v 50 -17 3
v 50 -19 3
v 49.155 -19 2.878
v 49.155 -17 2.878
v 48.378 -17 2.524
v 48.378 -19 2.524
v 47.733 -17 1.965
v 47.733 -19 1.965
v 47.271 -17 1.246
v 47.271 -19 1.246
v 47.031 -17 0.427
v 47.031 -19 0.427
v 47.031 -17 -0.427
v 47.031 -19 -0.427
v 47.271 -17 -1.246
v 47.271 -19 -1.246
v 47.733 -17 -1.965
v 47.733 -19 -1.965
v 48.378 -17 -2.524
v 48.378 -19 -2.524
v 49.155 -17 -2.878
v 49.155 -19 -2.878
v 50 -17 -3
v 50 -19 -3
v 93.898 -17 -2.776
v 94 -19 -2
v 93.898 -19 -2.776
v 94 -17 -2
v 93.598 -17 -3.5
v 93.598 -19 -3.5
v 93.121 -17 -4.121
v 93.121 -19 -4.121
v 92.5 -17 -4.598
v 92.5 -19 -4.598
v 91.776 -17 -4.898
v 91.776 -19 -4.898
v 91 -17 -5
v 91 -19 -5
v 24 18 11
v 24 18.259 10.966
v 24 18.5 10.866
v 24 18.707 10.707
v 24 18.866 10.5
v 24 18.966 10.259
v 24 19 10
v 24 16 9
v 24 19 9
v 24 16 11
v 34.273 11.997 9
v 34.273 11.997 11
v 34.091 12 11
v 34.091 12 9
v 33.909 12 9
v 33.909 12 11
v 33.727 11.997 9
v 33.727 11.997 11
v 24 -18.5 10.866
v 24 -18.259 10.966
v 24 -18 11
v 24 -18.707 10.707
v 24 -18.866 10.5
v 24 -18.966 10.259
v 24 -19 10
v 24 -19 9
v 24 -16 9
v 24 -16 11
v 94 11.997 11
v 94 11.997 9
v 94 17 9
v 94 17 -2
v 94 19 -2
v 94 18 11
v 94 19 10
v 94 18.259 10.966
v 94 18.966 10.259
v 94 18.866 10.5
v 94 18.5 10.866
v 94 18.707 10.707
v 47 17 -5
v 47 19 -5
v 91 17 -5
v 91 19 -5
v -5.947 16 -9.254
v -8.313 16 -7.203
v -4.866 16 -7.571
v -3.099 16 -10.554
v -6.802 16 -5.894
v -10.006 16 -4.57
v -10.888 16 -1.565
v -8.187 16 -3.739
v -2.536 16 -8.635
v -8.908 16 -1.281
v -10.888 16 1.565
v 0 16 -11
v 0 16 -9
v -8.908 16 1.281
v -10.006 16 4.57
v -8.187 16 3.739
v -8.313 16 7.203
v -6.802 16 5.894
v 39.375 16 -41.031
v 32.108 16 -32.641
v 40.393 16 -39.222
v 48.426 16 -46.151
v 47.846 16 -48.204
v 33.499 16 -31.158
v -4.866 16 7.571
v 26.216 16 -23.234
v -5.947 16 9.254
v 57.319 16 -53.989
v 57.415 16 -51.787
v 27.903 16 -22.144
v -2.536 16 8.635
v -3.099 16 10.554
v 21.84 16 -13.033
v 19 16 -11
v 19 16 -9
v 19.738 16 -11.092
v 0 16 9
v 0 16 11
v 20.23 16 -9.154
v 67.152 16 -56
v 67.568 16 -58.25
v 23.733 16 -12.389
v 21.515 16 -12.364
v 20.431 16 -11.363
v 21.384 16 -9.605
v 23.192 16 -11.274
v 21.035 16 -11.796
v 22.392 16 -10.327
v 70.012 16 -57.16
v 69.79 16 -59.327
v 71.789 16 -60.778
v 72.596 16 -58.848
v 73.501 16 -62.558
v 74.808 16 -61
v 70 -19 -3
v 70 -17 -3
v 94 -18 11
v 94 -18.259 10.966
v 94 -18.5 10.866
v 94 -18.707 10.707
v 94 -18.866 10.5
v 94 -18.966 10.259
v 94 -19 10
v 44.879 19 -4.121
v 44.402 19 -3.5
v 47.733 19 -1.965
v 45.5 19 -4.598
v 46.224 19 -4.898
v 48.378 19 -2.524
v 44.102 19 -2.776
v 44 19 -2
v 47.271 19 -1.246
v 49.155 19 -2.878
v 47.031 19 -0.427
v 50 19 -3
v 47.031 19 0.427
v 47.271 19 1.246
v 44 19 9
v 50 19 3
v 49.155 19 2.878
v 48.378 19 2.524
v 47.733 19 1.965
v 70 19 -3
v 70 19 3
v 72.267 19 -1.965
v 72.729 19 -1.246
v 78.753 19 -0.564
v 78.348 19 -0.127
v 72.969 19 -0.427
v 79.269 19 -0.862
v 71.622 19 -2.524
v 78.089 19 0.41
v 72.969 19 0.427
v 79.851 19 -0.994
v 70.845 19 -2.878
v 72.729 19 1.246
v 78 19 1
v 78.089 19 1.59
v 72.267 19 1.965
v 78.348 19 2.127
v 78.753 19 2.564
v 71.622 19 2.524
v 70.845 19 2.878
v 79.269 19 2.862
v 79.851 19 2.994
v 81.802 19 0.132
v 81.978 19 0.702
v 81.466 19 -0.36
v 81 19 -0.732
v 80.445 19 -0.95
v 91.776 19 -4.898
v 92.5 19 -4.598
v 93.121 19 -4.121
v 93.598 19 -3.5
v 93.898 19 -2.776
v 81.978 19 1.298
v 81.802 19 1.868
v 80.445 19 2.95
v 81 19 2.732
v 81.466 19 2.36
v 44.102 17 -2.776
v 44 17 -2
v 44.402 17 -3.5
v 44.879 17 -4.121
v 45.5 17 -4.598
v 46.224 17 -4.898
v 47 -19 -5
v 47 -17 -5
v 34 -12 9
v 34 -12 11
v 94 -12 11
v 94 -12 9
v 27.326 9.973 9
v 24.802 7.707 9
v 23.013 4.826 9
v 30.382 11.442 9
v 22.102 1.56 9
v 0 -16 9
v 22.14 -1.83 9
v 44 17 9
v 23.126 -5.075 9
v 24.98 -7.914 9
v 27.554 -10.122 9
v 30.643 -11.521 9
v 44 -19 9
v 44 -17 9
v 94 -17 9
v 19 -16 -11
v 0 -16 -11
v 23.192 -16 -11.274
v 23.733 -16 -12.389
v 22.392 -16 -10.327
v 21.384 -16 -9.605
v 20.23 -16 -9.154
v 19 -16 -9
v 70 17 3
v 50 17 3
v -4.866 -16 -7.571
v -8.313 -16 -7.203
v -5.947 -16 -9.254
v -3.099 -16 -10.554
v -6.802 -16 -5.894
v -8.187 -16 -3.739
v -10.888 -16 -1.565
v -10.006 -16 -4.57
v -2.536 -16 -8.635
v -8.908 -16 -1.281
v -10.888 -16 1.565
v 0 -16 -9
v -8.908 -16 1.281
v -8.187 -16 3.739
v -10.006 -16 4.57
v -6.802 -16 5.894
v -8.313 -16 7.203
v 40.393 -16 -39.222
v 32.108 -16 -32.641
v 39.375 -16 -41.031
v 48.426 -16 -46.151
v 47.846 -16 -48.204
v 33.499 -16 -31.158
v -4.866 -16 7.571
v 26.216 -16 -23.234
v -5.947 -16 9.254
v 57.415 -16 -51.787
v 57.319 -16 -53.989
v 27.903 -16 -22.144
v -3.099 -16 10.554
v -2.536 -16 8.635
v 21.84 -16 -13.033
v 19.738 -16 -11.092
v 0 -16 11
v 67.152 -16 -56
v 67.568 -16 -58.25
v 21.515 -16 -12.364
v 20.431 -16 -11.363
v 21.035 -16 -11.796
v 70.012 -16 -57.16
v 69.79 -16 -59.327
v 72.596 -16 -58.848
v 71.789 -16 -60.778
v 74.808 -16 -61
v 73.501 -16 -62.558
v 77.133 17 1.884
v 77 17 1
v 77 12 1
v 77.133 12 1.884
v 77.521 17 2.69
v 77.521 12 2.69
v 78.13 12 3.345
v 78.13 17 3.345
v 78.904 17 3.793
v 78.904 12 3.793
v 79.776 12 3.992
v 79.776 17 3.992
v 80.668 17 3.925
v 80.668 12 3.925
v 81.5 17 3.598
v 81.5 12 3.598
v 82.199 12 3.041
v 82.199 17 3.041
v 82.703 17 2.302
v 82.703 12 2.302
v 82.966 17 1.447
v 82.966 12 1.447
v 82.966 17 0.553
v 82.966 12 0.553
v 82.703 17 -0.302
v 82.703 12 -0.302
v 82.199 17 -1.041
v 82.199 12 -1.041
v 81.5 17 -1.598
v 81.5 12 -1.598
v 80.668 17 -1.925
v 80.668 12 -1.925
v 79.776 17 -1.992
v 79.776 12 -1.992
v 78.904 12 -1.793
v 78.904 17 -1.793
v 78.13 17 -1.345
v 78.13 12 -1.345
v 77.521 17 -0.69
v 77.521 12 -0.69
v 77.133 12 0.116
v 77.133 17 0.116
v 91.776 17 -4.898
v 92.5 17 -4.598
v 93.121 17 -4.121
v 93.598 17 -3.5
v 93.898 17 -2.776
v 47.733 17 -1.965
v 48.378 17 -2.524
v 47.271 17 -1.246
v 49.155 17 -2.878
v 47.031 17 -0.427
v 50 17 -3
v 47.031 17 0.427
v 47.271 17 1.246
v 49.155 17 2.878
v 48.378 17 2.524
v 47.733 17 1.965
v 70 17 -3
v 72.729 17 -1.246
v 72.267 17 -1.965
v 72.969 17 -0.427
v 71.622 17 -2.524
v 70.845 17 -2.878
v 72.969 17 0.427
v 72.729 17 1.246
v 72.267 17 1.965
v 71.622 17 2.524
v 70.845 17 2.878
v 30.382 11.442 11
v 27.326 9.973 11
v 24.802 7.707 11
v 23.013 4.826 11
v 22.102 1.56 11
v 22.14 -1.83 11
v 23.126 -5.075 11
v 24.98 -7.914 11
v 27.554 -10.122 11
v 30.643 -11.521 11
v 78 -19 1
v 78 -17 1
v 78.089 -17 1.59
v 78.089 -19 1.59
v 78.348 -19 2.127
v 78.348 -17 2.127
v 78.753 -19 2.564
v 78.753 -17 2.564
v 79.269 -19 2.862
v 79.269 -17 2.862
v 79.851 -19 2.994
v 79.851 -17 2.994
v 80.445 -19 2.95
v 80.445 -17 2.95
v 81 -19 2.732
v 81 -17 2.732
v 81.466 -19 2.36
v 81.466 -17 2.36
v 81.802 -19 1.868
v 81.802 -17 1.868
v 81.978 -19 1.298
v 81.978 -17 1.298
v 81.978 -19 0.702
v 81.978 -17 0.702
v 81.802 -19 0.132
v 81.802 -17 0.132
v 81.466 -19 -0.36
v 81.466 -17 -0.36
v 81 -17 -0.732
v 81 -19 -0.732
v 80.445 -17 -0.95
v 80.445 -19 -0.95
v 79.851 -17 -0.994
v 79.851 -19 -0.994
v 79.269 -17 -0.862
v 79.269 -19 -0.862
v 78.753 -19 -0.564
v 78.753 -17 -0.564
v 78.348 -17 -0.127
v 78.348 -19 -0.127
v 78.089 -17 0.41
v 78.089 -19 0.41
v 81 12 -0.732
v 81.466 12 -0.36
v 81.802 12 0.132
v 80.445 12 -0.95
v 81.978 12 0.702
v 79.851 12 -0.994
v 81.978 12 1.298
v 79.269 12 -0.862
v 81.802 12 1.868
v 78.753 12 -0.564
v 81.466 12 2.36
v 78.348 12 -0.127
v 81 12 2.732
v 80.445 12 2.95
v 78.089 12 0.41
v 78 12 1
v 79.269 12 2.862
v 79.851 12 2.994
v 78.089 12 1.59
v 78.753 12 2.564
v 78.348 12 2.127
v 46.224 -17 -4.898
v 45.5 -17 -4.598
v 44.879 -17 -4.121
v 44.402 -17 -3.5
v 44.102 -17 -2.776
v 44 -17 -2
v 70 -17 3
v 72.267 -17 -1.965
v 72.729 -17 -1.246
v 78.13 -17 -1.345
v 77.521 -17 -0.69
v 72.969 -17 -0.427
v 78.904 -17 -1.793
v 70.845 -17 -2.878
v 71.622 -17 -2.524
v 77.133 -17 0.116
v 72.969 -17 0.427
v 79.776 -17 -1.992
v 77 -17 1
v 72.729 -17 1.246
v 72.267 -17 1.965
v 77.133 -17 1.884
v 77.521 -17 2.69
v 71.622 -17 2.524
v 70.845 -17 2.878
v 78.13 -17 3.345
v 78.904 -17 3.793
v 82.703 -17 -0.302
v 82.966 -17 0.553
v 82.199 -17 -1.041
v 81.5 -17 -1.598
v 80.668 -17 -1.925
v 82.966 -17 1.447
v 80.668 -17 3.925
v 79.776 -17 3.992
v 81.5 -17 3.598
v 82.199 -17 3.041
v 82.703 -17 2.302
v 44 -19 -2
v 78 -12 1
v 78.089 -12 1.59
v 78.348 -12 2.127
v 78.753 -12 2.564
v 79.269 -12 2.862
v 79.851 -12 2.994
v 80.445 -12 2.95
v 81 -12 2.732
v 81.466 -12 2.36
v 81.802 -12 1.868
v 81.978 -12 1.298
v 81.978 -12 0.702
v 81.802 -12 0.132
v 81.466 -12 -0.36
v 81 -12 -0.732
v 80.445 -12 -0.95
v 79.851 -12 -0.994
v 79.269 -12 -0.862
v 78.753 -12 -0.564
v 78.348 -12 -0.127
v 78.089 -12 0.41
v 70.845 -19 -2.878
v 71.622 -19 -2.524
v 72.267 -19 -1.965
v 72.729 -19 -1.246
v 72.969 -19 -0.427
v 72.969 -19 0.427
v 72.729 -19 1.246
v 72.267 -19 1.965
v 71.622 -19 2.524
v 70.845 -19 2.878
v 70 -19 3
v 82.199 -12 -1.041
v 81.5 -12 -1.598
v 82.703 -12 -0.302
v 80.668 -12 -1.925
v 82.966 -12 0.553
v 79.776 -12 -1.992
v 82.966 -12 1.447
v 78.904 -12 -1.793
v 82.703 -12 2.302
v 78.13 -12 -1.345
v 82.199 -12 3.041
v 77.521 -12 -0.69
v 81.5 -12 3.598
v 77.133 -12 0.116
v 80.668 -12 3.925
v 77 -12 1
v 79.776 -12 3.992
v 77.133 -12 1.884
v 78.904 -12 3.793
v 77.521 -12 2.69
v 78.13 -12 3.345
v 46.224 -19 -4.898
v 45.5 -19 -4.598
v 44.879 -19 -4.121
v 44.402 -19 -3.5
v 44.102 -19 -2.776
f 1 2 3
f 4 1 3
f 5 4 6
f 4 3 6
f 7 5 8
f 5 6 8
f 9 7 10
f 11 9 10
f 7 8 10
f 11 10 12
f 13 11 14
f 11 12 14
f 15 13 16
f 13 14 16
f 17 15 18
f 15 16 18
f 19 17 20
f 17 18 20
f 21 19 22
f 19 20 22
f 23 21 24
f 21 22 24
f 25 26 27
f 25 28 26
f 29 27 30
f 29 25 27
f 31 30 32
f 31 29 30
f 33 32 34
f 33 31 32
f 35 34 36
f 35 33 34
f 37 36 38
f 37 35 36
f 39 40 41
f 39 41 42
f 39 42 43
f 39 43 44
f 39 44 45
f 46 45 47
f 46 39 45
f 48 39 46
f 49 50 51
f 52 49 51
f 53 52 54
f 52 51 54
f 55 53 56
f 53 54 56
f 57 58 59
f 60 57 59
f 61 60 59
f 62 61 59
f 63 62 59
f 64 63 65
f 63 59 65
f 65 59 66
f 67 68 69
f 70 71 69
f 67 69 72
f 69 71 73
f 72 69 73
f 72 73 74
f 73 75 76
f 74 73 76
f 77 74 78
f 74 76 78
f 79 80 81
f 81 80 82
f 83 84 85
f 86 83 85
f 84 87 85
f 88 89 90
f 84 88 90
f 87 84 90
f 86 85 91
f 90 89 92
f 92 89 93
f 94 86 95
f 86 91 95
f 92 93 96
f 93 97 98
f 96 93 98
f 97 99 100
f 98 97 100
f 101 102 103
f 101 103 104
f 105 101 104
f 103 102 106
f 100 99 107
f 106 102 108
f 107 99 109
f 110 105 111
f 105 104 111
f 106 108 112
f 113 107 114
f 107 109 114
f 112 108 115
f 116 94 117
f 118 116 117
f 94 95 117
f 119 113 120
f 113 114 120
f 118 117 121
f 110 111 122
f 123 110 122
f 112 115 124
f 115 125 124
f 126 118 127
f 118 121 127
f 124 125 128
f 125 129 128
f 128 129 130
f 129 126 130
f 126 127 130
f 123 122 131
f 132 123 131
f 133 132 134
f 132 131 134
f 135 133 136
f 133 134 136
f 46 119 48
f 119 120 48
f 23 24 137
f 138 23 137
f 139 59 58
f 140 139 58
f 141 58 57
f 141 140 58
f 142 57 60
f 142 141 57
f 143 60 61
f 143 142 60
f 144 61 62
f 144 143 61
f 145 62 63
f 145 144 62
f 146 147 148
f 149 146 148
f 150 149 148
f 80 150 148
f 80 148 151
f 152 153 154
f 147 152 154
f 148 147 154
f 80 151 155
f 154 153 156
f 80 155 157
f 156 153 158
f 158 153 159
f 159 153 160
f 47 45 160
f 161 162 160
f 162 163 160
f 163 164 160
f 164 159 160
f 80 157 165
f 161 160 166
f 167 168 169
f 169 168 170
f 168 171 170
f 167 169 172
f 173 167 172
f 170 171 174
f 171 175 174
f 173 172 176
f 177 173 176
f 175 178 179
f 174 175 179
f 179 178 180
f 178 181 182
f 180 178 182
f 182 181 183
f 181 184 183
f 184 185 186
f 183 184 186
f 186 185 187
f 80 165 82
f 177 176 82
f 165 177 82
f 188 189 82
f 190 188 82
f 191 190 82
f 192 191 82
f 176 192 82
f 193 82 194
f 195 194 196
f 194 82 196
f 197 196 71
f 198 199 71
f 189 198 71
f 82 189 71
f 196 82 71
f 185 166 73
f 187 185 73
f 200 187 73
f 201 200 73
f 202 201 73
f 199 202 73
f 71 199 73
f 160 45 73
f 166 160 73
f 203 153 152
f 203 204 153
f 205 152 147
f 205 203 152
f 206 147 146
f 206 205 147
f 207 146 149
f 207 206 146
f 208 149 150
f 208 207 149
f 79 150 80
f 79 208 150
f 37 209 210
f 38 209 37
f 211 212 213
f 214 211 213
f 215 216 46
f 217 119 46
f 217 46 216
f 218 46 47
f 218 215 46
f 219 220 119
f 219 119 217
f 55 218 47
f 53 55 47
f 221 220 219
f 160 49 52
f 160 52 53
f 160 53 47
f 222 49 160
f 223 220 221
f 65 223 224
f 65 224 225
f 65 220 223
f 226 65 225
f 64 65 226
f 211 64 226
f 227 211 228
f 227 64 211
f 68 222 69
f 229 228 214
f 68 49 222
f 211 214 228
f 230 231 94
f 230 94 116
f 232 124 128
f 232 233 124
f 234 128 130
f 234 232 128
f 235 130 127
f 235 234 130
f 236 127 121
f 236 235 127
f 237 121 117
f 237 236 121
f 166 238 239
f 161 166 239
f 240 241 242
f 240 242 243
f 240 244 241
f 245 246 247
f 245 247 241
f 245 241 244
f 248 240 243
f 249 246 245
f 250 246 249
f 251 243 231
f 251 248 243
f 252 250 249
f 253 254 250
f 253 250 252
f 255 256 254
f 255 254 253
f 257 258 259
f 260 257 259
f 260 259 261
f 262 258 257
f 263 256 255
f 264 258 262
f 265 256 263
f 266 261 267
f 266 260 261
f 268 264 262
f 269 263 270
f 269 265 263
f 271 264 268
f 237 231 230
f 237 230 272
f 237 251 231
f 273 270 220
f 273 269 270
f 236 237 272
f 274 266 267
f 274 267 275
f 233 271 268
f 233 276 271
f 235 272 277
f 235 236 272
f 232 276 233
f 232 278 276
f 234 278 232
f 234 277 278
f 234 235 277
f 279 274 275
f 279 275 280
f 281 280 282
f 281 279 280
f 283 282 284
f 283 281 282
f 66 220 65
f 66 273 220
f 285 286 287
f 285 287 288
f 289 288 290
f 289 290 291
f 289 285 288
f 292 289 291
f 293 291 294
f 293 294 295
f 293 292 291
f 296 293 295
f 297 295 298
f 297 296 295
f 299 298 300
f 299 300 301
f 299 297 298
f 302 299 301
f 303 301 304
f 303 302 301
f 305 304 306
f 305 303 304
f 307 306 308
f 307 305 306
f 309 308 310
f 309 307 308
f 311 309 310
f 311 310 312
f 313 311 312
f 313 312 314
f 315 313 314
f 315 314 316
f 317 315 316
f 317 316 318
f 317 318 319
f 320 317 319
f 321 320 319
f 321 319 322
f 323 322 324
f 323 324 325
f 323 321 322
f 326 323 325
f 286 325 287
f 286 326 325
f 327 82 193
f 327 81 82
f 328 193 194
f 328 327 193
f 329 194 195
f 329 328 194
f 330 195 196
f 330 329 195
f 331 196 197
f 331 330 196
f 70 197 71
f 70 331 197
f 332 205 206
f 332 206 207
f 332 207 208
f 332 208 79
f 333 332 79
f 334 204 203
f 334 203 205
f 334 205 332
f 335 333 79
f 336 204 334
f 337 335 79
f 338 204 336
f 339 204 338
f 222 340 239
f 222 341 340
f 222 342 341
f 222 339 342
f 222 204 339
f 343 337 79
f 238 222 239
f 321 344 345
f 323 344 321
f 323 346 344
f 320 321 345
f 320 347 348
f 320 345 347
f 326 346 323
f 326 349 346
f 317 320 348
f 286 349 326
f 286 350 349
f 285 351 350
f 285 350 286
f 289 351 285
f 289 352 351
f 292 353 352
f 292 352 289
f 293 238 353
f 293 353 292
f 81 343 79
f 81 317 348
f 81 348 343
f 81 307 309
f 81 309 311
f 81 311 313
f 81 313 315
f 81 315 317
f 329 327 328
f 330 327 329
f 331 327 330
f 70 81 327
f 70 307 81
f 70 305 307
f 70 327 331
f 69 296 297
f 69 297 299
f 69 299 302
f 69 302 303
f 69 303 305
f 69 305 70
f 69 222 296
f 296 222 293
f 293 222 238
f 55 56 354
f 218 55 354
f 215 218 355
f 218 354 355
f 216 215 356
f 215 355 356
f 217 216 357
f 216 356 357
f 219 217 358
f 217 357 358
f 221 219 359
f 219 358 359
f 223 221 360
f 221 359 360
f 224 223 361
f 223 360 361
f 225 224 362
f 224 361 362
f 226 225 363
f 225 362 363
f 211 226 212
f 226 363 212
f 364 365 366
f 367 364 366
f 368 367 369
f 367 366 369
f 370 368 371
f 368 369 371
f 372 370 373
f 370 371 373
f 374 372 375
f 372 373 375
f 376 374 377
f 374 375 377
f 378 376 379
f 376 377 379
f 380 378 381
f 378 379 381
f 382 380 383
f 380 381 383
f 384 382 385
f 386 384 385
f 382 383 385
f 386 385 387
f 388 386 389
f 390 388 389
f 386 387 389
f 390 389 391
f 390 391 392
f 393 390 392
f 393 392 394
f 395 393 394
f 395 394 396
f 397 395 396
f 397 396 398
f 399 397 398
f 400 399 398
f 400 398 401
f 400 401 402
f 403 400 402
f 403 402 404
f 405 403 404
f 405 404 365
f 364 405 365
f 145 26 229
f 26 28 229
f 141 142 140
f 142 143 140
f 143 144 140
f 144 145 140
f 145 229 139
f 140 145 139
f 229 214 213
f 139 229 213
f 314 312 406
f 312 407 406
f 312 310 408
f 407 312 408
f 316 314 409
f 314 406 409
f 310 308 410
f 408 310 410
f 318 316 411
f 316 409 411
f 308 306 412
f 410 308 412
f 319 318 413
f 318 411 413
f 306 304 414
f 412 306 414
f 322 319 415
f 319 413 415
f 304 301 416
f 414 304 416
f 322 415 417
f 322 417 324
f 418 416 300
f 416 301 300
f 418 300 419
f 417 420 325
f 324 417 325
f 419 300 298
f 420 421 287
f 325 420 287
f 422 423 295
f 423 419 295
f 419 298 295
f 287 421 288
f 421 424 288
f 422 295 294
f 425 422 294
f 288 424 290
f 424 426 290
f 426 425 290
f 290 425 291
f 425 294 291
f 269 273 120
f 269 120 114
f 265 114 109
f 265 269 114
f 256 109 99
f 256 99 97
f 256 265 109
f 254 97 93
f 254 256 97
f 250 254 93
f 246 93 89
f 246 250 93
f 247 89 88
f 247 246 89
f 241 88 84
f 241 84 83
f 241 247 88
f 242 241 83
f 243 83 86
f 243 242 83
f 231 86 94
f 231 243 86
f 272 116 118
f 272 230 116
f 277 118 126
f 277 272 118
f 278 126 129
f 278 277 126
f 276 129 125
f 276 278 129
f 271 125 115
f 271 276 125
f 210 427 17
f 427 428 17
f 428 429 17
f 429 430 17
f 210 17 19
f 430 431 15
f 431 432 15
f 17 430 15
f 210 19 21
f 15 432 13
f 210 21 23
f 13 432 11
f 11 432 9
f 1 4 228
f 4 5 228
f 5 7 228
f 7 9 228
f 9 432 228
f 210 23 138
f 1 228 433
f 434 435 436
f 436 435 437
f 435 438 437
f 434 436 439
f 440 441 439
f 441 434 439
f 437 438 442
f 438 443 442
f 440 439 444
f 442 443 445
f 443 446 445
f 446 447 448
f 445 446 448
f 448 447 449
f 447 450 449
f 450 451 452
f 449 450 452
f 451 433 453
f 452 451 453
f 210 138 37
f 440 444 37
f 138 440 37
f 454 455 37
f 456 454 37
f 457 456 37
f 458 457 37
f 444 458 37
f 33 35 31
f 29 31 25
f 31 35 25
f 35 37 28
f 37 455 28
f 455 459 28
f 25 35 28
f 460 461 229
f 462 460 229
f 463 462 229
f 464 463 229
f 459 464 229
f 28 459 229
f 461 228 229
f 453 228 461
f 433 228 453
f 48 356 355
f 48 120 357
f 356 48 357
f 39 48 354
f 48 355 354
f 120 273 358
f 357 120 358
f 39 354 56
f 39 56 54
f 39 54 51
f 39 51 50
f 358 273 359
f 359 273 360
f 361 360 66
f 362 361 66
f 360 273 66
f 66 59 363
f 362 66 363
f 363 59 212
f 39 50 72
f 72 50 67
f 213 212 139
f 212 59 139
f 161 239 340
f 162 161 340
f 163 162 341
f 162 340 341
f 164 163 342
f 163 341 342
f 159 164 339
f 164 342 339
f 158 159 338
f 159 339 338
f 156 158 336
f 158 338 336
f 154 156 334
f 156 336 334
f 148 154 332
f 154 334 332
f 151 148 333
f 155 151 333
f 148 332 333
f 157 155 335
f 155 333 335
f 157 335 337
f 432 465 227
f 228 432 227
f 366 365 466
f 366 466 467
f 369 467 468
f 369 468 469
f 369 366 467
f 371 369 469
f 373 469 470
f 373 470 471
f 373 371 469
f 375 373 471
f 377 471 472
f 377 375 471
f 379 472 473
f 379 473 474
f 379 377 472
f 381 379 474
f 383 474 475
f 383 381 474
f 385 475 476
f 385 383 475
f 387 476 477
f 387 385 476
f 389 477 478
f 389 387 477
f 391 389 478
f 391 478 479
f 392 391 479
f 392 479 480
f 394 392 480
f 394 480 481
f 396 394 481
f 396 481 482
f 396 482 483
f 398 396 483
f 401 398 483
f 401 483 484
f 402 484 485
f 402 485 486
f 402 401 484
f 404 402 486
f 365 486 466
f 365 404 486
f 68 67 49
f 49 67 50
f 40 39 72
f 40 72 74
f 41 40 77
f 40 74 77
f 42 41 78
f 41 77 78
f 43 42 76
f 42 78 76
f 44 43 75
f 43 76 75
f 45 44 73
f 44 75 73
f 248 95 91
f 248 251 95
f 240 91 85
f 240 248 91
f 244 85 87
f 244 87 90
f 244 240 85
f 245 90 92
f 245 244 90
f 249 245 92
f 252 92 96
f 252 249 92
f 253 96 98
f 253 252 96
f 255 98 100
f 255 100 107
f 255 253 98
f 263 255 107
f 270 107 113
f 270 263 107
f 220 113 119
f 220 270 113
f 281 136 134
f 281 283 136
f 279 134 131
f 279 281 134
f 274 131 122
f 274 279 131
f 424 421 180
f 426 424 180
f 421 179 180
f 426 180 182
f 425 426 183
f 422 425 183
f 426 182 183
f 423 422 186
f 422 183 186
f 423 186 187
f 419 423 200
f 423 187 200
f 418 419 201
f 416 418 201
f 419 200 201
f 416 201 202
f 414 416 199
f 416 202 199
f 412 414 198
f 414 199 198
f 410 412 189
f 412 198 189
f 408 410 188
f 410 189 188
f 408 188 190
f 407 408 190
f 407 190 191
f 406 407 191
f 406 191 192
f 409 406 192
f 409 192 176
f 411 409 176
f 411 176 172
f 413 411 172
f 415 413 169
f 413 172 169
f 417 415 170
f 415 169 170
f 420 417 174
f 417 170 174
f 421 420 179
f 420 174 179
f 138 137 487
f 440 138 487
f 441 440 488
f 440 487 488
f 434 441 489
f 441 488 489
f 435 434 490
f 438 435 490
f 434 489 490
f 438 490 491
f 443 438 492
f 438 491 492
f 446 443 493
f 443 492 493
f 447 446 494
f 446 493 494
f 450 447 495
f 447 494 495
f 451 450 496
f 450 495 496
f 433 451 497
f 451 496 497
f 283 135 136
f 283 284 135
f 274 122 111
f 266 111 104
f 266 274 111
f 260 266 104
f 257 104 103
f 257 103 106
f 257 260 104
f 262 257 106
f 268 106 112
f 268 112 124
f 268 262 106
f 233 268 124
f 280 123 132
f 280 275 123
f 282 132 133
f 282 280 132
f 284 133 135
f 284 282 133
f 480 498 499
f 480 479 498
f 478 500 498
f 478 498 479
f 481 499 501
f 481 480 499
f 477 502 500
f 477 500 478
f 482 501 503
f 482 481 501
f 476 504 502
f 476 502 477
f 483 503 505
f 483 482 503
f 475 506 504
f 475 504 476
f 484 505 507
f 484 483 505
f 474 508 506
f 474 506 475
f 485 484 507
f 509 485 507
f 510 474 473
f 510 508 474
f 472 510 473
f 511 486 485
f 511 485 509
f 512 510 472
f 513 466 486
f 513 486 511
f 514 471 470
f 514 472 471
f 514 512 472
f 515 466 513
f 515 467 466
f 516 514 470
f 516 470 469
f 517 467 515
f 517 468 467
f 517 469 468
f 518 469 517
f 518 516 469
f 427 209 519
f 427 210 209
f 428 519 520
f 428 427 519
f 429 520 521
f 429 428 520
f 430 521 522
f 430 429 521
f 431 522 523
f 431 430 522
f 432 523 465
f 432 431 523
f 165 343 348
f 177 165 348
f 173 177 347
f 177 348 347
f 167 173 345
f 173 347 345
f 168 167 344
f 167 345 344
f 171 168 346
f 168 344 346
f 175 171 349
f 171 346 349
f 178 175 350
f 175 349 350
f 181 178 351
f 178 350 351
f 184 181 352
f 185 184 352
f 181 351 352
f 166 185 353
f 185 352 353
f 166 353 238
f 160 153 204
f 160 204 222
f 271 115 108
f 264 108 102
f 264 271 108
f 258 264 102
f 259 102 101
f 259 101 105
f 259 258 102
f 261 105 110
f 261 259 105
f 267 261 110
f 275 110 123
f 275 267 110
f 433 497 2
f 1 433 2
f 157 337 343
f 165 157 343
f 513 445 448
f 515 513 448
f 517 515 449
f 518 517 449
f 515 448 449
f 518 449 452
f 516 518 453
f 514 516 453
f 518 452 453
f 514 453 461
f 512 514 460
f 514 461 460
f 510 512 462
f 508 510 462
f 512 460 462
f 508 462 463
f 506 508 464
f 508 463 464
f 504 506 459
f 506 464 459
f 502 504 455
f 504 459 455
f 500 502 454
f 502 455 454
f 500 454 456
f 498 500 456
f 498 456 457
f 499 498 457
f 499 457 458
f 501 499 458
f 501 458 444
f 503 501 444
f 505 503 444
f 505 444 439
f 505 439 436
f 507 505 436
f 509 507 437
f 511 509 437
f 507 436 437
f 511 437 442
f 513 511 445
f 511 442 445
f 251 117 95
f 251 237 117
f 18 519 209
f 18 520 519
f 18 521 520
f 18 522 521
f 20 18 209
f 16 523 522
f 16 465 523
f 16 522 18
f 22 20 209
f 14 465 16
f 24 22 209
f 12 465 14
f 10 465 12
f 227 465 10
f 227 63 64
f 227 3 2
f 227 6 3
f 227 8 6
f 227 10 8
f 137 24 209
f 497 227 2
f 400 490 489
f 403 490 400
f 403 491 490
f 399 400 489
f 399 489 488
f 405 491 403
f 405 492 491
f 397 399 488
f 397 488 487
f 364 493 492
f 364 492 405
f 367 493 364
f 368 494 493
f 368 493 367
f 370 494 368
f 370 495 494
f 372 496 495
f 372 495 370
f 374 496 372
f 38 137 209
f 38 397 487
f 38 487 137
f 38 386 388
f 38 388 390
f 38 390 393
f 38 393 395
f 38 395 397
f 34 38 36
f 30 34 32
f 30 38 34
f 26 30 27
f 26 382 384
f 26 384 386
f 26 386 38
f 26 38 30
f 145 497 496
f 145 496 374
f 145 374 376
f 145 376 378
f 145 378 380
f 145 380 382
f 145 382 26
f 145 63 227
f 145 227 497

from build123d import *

# Parameters (mm, degrees)
F1_DEPTH  = 16
F2_W      = 70
F2_H      = 3
F3_DEPTH  = 2
F4_W      = 50
F4_H      = 14
F5_DEPTH  = 2
F6_R      = 1
F9_DEPTH  = 2
F11_DEPTH = 38.001
F13_D     = 4
F14_R     = 2.999996841
F14_R_2   = 2
F15_DEPTH = 5
F16_R     = 3


# Not quite as in the source:
# - a pattern or mirror of a feature is missing from the dataset's text; its kind, count and spacing are read off the source's solid


with BuildPart() as f1:
    # F0 (on Front) → F1 (new body)
    with BuildSketch(Plane.XZ):
        with BuildLine():
            ThreePointArc((0, -9), (-9, 0), (0, 9))
            Line((0, 9), (94, 9))
            Line((94, 9), (94, 11))
            Line((94, 11), (0, 11))
            ThreePointArc((0, 11), (-11, 0), (0, -11))
            Line((0, -11), (19, -11))
            ThreePointArc((19, -11), (20.7464347921, -11.5607448848), (21.84, -13.0333563221))
            ThreePointArc((21.84, -13.0333563221), (39.3752187726, -41.0308955197), (67.5680682322, -58.2503420228))
            ThreePointArc((67.5680682322, -58.2503420228), (70.8216506695, -60.0087849904), (73.5012506711, -62.5578366136))
            Line((73.5012506711, -62.5578366136), (74.808430799, -61))
            ThreePointArc((74.808430799, -61), (71.3448519203, -57.9413219983), (67.1516242057, -56))
            ThreePointArc((67.1516242057, -56), (40.3930033582, -39.2216179023), (23.7333333333, -12.3889272035))
            ThreePointArc((23.7333333333, -12.3889272035), (21.9107246536, -9.9345748081), (19, -9))
            Line((19, -9), (0, -9))
        make_face()
    extrude(amount=F1_DEPTH)

    # F2 (on face) → F3 (join)
    with BuildSketch(Plane.XY.offset(11)):
        with Locations((59, -17.5)):
            Rectangle(F2_W, F2_H)
    extrude(amount=-F3_DEPTH)

    # F4 (on face) → F5 (join)
    with BuildSketch(Plane.XZ.offset(19)):
        with Locations((69, 2)):
            Rectangle(F4_W, F4_H)
    extrude(amount=-F5_DEPTH)

    # F6
    f6_edges = [f1.edges().sort_by_distance(p)[0] for p in [
        (59, -19, 11),
    ]]
    fillet(f6_edges, radius=F6_R)

    # F7: F1 across plane


with BuildPart() as f1_1:
    add(f1.part)
    add(f1.part.mirror(Plane.XZ))

    # F8 (on face) → F9 (cut)
    with BuildSketch(Plane.XY.offset(11)):
        with BuildLine():
            Line((33.7271293001, 11.9968971647), (34.2728706999, 11.9968971647))
            ThreePointArc((34.2728706999, 11.9968971647), (34, 12), (33.7271293001, 11.9968971647))
        make_face()
        with BuildLine():
            Line((94, 11.9968971647), (34.2728706999, 11.9968971647))
            Line((34.2728706999, 11.9968971647), (33.7271293001, 11.9968971647))
            ThreePointArc((33.7271293001, 11.9968971647), (22.0007757339, -0.1364441703), (34, -12))
            Line((34, -12), (94, -12))
            Line((94, -12), (94, 11.9968971647))
        make_face()
    extrude(amount=-F9_DEPTH, mode=Mode.SUBTRACT)

    # F10 (on face) → F11 (cut, through all)
    with BuildSketch(Plane.XZ.offset(19)):
        with BuildLine():
            ThreePointArc((50, 3), (47, 0), (50, -3))
            Line((50, -3), (70, -3))
            ThreePointArc((70, -3), (73, 0), (70, 3))
            Line((70, 3), (50, 3))
        make_face()
    extrude(amount=-F11_DEPTH, mode=Mode.SUBTRACT)

    # F13 (through all)
    with Locations(Plane.XZ.offset(19)):
        with Locations((80, 1)):
            Hole(F13_D / 2)

    # F14 (on face) → F15 (join)
    with BuildSketch(Plane(origin=(0, -17, 0), x_dir=(-1, 0, 0), z_dir=(0, 1, 0))):
        with Locations((-80, 1)):
            Circle(F14_R)
        with Locations((-80, 1)):
            Circle(F14_R_2, mode=Mode.SUBTRACT)
    f15 = extrude(amount=F15_DEPTH)

    # F15_copies: F15 across plane
    add(f15.mirror(Plane.ZX))

    # F16
    f16_edges = [f1_1.edges().sort_by_distance(p)[0] for p in [
        (94, -18, -5),
        (44, -18, -5),
        (94, 18, -5),
        (44, 18, -5),
    ]]
    fillet(f16_edges, radius=F16_R)


solid = f1_1.part
